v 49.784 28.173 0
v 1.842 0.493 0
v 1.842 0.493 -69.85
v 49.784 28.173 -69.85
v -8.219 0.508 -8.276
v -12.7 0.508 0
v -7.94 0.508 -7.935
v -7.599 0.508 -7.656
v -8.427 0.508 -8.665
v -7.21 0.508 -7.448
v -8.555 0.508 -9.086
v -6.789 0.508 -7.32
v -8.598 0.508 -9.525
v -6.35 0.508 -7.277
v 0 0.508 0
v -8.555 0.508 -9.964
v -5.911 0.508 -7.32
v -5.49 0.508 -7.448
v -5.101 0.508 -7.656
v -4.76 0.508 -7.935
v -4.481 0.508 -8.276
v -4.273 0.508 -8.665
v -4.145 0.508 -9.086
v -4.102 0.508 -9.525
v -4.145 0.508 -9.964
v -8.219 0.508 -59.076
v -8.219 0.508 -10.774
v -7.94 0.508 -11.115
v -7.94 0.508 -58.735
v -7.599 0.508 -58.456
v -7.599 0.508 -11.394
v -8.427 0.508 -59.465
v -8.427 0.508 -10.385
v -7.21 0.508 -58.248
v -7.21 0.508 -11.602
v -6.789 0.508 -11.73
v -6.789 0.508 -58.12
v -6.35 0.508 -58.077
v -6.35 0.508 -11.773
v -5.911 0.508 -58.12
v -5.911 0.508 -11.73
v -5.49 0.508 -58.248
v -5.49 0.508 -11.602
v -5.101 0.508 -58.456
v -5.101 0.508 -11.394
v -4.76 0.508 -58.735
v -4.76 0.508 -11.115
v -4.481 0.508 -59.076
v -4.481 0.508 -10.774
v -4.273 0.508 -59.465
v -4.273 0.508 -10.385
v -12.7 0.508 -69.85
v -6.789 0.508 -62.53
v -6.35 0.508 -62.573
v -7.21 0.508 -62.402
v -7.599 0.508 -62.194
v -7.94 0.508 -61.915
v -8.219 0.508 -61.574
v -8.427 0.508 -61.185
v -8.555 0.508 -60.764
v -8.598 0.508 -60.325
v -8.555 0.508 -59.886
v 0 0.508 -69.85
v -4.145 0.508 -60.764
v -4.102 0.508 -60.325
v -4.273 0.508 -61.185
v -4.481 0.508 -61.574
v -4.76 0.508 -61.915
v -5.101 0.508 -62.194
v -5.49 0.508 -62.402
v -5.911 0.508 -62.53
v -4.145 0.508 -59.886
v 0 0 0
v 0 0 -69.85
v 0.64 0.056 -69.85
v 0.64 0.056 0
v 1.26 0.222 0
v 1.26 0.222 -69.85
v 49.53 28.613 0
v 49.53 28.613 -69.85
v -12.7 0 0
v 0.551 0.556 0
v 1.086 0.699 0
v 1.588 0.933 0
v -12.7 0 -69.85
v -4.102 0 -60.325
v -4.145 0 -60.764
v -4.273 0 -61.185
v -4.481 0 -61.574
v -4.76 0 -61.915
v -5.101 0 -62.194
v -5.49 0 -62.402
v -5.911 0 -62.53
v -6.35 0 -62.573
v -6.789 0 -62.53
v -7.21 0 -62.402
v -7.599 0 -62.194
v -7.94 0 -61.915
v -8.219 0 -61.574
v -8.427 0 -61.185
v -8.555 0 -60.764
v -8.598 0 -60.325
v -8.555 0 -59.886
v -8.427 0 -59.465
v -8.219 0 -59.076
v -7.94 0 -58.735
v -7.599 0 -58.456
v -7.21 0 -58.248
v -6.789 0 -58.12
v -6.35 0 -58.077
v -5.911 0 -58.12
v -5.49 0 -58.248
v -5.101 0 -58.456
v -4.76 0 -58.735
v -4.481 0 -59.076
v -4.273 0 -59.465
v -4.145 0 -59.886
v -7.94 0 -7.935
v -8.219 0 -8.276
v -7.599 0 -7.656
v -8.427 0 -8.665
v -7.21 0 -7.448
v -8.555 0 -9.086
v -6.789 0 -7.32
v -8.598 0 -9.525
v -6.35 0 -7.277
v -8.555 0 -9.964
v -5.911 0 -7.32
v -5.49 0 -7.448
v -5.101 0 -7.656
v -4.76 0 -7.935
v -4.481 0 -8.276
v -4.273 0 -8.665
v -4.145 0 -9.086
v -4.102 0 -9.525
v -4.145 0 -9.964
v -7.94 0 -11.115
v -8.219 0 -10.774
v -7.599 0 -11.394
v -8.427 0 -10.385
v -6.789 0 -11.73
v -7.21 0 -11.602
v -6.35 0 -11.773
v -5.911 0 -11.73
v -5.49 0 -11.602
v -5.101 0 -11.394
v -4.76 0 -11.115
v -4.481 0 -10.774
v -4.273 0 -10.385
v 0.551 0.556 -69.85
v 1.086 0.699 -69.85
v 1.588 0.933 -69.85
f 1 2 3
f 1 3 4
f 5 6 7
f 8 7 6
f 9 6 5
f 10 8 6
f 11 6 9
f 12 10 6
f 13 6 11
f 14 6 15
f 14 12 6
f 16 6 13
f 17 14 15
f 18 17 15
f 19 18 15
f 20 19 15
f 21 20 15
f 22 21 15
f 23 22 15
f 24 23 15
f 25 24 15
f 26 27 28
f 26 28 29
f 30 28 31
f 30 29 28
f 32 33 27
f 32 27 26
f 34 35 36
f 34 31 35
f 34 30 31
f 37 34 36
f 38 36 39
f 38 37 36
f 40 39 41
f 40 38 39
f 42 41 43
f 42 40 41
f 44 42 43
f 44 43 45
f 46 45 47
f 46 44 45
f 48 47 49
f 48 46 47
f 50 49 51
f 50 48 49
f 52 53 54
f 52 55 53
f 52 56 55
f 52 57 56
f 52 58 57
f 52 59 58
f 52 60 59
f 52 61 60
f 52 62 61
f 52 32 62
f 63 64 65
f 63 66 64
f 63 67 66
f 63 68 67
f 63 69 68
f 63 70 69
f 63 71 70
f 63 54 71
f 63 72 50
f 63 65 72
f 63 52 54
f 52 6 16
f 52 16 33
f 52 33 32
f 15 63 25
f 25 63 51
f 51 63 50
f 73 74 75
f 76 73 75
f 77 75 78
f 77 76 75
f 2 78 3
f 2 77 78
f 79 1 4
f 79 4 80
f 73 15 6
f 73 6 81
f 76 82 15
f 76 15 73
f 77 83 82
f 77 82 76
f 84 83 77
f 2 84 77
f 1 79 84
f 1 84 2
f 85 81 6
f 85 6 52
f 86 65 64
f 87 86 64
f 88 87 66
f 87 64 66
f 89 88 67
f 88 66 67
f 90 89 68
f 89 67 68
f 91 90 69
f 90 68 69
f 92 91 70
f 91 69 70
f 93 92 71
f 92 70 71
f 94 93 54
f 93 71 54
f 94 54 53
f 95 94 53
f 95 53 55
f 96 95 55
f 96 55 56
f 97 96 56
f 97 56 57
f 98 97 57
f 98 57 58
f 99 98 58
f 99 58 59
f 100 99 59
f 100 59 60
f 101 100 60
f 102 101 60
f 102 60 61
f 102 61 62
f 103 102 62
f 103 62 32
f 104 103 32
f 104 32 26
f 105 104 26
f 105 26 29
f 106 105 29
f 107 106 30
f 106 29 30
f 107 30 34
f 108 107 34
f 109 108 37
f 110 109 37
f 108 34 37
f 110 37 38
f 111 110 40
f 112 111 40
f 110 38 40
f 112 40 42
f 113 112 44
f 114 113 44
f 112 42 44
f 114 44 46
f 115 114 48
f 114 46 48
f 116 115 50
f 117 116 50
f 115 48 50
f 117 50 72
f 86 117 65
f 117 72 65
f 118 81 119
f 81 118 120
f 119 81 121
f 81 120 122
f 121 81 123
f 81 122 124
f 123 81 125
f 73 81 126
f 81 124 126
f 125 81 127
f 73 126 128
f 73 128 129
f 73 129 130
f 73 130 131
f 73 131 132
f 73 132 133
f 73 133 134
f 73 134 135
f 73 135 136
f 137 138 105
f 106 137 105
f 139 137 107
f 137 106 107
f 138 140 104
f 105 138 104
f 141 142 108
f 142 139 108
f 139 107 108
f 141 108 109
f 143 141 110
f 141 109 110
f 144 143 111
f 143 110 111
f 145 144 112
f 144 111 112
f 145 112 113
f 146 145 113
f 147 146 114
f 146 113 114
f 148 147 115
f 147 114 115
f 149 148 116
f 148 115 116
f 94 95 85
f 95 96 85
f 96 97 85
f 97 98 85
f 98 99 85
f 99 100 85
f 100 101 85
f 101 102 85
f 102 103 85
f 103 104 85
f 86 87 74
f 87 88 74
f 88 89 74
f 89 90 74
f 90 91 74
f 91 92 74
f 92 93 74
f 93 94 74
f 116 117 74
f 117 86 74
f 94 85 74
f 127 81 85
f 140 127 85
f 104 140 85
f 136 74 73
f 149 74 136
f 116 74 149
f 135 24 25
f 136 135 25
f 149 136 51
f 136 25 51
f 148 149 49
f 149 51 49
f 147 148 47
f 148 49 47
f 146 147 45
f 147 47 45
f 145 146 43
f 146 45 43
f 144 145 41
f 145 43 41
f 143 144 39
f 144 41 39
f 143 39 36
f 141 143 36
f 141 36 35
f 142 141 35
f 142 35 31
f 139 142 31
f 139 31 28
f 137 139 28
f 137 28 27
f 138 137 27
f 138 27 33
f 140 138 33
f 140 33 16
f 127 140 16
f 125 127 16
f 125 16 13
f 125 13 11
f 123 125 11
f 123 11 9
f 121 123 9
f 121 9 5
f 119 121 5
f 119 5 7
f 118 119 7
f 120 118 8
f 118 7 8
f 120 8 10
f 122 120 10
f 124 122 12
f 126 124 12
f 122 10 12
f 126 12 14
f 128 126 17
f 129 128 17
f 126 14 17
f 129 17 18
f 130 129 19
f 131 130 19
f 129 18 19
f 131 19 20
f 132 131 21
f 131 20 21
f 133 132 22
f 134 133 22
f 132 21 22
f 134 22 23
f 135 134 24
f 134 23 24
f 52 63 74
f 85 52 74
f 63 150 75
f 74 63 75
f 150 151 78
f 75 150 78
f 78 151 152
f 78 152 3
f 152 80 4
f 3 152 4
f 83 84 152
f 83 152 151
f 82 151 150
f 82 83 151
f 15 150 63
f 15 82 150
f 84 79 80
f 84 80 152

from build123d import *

# Parameters (mm, degrees)
SKETCH2_W             = 12.7
SKETCH2_H             = 69.85
BOSS_EXTRUDE2_DEPTH   = 0.508
EDGE_FLANGE2_DEPTH    = 69.85
F_8_CLEARANCE_HOLE1_D = 4.4958


# Sheet-metal steps are written as plain solids
with BuildPart() as part:
    # Sketch2 → Boss-Extrude2 (new body)
    with BuildSketch(Plane(origin=(0, 0, 0), x_dir=(1, 0, 0), z_dir=(0, 1, 0))):
        with Locations((-6.35, 34.925)):
            Rectangle(SKETCH2_W, SKETCH2_H)
    extrude(amount=BOSS_EXTRUDE2_DEPTH)

    # Edge-Flange2 section (across the edge) → Edge-Flange2 (add)
    with BuildSketch(Plane(origin=(0.850738686, 0.508, 0), x_dir=(-0.49999999999999495, 0.8660254037844416, 0), z_dir=(0, 0, -1))):
        with BuildLine():
            Line((-0.508, 0.850738686), (-0.508, 56.2102))
            Line((-0.508, 56.2102), (0, 56.2102))
            Line((0, 56.2102), (0, 0.850738686))
            ThreePointArc((0, 0.850738686), (0.108185502, 0.028988218), (0.425369343, -0.736761314))
            Line((0.425369343, -0.736761314), (-0.014571562, -0.990761314))
            ThreePointArc((-0.014571562, -0.990761314), (-0.382504818, -0.102491857), (-0.508, 0.850738686))
        make_face()
    extrude(amount=EDGE_FLANGE2_DEPTH)

    # #8 Clearance Hole1 (through all)
    with Locations(Plane(origin=(0, 0, 0), x_dir=(-1, 0, 0), z_dir=(0, -1, 0))):
        with Locations((6.35, 60.325), (6.35, 9.525)):
            Hole(F_8_CLEARANCE_HOLE1_D / 2)


solid = part.part
